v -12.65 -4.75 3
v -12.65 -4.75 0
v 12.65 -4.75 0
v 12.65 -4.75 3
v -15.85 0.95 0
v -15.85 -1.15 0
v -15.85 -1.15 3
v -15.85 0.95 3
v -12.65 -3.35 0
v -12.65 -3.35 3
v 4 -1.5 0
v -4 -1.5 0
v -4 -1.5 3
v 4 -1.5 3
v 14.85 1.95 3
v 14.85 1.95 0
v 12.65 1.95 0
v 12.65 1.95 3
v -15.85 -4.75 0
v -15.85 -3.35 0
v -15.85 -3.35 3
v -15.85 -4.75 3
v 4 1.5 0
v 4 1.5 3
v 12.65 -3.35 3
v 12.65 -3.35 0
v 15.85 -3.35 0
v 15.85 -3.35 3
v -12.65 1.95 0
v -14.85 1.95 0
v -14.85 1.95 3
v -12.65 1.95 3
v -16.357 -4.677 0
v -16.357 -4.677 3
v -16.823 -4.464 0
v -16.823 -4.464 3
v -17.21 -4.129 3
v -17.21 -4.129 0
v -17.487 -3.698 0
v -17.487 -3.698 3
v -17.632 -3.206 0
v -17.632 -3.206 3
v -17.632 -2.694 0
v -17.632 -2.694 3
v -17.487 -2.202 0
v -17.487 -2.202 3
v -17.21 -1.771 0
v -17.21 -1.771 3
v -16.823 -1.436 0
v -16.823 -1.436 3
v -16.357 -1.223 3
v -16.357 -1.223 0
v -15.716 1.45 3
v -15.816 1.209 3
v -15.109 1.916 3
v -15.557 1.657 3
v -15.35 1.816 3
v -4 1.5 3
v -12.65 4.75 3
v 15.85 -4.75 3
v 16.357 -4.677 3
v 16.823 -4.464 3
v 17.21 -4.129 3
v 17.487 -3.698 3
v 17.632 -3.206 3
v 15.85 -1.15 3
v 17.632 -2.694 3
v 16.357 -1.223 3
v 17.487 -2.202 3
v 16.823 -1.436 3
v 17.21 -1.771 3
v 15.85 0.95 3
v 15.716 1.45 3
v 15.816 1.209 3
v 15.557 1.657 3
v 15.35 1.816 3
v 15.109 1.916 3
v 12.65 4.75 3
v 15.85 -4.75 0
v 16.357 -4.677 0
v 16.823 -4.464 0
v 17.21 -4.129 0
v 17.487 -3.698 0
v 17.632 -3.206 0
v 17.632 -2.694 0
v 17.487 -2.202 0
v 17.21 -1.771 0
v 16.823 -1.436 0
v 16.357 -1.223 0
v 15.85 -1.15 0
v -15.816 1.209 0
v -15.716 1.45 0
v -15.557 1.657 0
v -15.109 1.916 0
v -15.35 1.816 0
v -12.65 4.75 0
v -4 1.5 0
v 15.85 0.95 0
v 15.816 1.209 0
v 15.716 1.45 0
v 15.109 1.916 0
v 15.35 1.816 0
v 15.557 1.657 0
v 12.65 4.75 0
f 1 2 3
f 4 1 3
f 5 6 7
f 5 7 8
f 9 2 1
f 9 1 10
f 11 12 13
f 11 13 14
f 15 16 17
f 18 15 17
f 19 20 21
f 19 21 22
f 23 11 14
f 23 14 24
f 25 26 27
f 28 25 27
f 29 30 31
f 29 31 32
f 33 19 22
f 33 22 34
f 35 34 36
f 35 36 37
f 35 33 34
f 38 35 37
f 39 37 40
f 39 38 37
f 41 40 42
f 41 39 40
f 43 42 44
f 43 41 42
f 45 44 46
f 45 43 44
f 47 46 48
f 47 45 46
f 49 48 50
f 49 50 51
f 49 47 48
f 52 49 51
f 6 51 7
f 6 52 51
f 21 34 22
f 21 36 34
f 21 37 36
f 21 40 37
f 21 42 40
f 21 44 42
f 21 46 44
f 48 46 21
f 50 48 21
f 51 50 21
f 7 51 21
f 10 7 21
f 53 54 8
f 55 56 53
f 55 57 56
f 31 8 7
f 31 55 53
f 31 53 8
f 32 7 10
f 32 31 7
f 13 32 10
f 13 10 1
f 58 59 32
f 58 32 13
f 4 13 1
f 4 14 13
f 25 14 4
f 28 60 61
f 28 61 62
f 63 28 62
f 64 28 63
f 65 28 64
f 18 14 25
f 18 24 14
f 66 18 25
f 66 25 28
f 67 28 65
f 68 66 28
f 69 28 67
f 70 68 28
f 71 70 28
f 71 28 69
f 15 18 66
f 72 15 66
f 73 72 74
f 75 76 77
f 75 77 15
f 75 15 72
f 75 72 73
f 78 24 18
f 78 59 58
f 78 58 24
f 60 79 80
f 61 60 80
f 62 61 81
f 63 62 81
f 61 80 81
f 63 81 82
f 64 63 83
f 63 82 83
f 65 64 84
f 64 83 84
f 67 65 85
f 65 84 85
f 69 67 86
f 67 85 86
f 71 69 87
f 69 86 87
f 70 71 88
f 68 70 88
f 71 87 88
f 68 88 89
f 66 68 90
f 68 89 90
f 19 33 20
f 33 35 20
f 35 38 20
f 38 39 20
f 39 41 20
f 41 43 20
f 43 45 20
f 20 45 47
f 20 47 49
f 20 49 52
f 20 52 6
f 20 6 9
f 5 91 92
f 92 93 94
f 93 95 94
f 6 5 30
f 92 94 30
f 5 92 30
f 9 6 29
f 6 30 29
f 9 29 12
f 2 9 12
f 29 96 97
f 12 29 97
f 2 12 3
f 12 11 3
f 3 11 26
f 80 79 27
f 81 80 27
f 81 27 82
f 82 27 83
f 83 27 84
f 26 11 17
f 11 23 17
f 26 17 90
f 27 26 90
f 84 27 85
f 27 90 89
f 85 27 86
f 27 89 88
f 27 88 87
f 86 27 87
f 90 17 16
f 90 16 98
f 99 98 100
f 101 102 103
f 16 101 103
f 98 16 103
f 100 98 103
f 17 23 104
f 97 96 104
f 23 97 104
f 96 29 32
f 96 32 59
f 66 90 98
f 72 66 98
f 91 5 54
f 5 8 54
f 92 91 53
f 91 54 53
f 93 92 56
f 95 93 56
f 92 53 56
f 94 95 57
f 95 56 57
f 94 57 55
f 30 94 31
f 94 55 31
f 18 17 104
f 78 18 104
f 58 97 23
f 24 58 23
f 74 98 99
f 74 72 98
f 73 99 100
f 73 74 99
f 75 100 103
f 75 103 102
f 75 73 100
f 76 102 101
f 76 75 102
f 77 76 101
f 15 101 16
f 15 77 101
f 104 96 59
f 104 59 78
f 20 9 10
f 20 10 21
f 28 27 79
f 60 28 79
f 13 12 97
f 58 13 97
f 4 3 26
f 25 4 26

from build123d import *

# Parameters (mm, degrees)
BASE_W                   = 25.3
BASE_H                   = 9.5
RESSALTO_EXTRUS_O1_DEPTH = 3
ESBO_O4_W                = 8
ESBO_O4_H                = 3
CORTE_EXTRUS_O1_DEPTH    = 14.841423337
RESSALTO_EXTRUS_O2_DEPTH = 3
FILETE1_R                = 1
FILETE1_OF_ESPELHAR1_R   = 1


with BuildPart() as part:
    # Base → Ressalto-extrusão1 (new body)
    with BuildSketch(Plane.XY):
        Rectangle(BASE_W, BASE_H)
    extrude(amount=RESSALTO_EXTRUS_O1_DEPTH)

    # Esboço4 → Corte-extrusão1 (cut, through all)
    with BuildSketch(Plane.XY):
        Rectangle(ESBO_O4_W, ESBO_O4_H)
    extrude(amount=CORTE_EXTRUS_O1_DEPTH, mode=Mode.SUBTRACT)

    # Esboço2 → Ressalto-extrusão2 (add, through all)
    with BuildSketch(Plane.XY):
        with BuildLine():
            Line((-12.65, -3.35), (-15.85, -3.35))
            Line((-15.85, -3.35), (-15.85, -4.75))
            ThreePointArc((-15.85, -4.75), (-17.65, -2.95), (-15.85, -1.15))
            Line((-15.85, -1.15), (-15.85, 1.95))
            Line((-15.85, 1.95), (-12.65, 1.95))
            Line((-12.65, 1.95), (-12.65, -3.35))
        make_face()
    ressalto_extrus_o2 = extrude(amount=RESSALTO_EXTRUS_O2_DEPTH)

    # Filete1
    filete1_edges = [part.edges().sort_by_distance(p)[0] for p in [
        (-15.85, 1.95, 1.5),
    ]]
    fillet(filete1_edges, radius=FILETE1_R)

    # Espelhar1: Ressalto-extrusão2 across plane
    add(ressalto_extrus_o2.mirror(Plane(origin=(0, 0, 0), x_dir=(0, 0, 1), z_dir=(1, 0, 0))))

    # Filete1 of Espelhar1
    filete1_of_espelhar1_edges = [part.edges().sort_by_distance(p)[0] for p in [
        (15.85, 1.95, 1.5),
    ]]
    fillet(filete1_of_espelhar1_edges, radius=FILETE1_OF_ESPELHAR1_R)


solid = part.part
